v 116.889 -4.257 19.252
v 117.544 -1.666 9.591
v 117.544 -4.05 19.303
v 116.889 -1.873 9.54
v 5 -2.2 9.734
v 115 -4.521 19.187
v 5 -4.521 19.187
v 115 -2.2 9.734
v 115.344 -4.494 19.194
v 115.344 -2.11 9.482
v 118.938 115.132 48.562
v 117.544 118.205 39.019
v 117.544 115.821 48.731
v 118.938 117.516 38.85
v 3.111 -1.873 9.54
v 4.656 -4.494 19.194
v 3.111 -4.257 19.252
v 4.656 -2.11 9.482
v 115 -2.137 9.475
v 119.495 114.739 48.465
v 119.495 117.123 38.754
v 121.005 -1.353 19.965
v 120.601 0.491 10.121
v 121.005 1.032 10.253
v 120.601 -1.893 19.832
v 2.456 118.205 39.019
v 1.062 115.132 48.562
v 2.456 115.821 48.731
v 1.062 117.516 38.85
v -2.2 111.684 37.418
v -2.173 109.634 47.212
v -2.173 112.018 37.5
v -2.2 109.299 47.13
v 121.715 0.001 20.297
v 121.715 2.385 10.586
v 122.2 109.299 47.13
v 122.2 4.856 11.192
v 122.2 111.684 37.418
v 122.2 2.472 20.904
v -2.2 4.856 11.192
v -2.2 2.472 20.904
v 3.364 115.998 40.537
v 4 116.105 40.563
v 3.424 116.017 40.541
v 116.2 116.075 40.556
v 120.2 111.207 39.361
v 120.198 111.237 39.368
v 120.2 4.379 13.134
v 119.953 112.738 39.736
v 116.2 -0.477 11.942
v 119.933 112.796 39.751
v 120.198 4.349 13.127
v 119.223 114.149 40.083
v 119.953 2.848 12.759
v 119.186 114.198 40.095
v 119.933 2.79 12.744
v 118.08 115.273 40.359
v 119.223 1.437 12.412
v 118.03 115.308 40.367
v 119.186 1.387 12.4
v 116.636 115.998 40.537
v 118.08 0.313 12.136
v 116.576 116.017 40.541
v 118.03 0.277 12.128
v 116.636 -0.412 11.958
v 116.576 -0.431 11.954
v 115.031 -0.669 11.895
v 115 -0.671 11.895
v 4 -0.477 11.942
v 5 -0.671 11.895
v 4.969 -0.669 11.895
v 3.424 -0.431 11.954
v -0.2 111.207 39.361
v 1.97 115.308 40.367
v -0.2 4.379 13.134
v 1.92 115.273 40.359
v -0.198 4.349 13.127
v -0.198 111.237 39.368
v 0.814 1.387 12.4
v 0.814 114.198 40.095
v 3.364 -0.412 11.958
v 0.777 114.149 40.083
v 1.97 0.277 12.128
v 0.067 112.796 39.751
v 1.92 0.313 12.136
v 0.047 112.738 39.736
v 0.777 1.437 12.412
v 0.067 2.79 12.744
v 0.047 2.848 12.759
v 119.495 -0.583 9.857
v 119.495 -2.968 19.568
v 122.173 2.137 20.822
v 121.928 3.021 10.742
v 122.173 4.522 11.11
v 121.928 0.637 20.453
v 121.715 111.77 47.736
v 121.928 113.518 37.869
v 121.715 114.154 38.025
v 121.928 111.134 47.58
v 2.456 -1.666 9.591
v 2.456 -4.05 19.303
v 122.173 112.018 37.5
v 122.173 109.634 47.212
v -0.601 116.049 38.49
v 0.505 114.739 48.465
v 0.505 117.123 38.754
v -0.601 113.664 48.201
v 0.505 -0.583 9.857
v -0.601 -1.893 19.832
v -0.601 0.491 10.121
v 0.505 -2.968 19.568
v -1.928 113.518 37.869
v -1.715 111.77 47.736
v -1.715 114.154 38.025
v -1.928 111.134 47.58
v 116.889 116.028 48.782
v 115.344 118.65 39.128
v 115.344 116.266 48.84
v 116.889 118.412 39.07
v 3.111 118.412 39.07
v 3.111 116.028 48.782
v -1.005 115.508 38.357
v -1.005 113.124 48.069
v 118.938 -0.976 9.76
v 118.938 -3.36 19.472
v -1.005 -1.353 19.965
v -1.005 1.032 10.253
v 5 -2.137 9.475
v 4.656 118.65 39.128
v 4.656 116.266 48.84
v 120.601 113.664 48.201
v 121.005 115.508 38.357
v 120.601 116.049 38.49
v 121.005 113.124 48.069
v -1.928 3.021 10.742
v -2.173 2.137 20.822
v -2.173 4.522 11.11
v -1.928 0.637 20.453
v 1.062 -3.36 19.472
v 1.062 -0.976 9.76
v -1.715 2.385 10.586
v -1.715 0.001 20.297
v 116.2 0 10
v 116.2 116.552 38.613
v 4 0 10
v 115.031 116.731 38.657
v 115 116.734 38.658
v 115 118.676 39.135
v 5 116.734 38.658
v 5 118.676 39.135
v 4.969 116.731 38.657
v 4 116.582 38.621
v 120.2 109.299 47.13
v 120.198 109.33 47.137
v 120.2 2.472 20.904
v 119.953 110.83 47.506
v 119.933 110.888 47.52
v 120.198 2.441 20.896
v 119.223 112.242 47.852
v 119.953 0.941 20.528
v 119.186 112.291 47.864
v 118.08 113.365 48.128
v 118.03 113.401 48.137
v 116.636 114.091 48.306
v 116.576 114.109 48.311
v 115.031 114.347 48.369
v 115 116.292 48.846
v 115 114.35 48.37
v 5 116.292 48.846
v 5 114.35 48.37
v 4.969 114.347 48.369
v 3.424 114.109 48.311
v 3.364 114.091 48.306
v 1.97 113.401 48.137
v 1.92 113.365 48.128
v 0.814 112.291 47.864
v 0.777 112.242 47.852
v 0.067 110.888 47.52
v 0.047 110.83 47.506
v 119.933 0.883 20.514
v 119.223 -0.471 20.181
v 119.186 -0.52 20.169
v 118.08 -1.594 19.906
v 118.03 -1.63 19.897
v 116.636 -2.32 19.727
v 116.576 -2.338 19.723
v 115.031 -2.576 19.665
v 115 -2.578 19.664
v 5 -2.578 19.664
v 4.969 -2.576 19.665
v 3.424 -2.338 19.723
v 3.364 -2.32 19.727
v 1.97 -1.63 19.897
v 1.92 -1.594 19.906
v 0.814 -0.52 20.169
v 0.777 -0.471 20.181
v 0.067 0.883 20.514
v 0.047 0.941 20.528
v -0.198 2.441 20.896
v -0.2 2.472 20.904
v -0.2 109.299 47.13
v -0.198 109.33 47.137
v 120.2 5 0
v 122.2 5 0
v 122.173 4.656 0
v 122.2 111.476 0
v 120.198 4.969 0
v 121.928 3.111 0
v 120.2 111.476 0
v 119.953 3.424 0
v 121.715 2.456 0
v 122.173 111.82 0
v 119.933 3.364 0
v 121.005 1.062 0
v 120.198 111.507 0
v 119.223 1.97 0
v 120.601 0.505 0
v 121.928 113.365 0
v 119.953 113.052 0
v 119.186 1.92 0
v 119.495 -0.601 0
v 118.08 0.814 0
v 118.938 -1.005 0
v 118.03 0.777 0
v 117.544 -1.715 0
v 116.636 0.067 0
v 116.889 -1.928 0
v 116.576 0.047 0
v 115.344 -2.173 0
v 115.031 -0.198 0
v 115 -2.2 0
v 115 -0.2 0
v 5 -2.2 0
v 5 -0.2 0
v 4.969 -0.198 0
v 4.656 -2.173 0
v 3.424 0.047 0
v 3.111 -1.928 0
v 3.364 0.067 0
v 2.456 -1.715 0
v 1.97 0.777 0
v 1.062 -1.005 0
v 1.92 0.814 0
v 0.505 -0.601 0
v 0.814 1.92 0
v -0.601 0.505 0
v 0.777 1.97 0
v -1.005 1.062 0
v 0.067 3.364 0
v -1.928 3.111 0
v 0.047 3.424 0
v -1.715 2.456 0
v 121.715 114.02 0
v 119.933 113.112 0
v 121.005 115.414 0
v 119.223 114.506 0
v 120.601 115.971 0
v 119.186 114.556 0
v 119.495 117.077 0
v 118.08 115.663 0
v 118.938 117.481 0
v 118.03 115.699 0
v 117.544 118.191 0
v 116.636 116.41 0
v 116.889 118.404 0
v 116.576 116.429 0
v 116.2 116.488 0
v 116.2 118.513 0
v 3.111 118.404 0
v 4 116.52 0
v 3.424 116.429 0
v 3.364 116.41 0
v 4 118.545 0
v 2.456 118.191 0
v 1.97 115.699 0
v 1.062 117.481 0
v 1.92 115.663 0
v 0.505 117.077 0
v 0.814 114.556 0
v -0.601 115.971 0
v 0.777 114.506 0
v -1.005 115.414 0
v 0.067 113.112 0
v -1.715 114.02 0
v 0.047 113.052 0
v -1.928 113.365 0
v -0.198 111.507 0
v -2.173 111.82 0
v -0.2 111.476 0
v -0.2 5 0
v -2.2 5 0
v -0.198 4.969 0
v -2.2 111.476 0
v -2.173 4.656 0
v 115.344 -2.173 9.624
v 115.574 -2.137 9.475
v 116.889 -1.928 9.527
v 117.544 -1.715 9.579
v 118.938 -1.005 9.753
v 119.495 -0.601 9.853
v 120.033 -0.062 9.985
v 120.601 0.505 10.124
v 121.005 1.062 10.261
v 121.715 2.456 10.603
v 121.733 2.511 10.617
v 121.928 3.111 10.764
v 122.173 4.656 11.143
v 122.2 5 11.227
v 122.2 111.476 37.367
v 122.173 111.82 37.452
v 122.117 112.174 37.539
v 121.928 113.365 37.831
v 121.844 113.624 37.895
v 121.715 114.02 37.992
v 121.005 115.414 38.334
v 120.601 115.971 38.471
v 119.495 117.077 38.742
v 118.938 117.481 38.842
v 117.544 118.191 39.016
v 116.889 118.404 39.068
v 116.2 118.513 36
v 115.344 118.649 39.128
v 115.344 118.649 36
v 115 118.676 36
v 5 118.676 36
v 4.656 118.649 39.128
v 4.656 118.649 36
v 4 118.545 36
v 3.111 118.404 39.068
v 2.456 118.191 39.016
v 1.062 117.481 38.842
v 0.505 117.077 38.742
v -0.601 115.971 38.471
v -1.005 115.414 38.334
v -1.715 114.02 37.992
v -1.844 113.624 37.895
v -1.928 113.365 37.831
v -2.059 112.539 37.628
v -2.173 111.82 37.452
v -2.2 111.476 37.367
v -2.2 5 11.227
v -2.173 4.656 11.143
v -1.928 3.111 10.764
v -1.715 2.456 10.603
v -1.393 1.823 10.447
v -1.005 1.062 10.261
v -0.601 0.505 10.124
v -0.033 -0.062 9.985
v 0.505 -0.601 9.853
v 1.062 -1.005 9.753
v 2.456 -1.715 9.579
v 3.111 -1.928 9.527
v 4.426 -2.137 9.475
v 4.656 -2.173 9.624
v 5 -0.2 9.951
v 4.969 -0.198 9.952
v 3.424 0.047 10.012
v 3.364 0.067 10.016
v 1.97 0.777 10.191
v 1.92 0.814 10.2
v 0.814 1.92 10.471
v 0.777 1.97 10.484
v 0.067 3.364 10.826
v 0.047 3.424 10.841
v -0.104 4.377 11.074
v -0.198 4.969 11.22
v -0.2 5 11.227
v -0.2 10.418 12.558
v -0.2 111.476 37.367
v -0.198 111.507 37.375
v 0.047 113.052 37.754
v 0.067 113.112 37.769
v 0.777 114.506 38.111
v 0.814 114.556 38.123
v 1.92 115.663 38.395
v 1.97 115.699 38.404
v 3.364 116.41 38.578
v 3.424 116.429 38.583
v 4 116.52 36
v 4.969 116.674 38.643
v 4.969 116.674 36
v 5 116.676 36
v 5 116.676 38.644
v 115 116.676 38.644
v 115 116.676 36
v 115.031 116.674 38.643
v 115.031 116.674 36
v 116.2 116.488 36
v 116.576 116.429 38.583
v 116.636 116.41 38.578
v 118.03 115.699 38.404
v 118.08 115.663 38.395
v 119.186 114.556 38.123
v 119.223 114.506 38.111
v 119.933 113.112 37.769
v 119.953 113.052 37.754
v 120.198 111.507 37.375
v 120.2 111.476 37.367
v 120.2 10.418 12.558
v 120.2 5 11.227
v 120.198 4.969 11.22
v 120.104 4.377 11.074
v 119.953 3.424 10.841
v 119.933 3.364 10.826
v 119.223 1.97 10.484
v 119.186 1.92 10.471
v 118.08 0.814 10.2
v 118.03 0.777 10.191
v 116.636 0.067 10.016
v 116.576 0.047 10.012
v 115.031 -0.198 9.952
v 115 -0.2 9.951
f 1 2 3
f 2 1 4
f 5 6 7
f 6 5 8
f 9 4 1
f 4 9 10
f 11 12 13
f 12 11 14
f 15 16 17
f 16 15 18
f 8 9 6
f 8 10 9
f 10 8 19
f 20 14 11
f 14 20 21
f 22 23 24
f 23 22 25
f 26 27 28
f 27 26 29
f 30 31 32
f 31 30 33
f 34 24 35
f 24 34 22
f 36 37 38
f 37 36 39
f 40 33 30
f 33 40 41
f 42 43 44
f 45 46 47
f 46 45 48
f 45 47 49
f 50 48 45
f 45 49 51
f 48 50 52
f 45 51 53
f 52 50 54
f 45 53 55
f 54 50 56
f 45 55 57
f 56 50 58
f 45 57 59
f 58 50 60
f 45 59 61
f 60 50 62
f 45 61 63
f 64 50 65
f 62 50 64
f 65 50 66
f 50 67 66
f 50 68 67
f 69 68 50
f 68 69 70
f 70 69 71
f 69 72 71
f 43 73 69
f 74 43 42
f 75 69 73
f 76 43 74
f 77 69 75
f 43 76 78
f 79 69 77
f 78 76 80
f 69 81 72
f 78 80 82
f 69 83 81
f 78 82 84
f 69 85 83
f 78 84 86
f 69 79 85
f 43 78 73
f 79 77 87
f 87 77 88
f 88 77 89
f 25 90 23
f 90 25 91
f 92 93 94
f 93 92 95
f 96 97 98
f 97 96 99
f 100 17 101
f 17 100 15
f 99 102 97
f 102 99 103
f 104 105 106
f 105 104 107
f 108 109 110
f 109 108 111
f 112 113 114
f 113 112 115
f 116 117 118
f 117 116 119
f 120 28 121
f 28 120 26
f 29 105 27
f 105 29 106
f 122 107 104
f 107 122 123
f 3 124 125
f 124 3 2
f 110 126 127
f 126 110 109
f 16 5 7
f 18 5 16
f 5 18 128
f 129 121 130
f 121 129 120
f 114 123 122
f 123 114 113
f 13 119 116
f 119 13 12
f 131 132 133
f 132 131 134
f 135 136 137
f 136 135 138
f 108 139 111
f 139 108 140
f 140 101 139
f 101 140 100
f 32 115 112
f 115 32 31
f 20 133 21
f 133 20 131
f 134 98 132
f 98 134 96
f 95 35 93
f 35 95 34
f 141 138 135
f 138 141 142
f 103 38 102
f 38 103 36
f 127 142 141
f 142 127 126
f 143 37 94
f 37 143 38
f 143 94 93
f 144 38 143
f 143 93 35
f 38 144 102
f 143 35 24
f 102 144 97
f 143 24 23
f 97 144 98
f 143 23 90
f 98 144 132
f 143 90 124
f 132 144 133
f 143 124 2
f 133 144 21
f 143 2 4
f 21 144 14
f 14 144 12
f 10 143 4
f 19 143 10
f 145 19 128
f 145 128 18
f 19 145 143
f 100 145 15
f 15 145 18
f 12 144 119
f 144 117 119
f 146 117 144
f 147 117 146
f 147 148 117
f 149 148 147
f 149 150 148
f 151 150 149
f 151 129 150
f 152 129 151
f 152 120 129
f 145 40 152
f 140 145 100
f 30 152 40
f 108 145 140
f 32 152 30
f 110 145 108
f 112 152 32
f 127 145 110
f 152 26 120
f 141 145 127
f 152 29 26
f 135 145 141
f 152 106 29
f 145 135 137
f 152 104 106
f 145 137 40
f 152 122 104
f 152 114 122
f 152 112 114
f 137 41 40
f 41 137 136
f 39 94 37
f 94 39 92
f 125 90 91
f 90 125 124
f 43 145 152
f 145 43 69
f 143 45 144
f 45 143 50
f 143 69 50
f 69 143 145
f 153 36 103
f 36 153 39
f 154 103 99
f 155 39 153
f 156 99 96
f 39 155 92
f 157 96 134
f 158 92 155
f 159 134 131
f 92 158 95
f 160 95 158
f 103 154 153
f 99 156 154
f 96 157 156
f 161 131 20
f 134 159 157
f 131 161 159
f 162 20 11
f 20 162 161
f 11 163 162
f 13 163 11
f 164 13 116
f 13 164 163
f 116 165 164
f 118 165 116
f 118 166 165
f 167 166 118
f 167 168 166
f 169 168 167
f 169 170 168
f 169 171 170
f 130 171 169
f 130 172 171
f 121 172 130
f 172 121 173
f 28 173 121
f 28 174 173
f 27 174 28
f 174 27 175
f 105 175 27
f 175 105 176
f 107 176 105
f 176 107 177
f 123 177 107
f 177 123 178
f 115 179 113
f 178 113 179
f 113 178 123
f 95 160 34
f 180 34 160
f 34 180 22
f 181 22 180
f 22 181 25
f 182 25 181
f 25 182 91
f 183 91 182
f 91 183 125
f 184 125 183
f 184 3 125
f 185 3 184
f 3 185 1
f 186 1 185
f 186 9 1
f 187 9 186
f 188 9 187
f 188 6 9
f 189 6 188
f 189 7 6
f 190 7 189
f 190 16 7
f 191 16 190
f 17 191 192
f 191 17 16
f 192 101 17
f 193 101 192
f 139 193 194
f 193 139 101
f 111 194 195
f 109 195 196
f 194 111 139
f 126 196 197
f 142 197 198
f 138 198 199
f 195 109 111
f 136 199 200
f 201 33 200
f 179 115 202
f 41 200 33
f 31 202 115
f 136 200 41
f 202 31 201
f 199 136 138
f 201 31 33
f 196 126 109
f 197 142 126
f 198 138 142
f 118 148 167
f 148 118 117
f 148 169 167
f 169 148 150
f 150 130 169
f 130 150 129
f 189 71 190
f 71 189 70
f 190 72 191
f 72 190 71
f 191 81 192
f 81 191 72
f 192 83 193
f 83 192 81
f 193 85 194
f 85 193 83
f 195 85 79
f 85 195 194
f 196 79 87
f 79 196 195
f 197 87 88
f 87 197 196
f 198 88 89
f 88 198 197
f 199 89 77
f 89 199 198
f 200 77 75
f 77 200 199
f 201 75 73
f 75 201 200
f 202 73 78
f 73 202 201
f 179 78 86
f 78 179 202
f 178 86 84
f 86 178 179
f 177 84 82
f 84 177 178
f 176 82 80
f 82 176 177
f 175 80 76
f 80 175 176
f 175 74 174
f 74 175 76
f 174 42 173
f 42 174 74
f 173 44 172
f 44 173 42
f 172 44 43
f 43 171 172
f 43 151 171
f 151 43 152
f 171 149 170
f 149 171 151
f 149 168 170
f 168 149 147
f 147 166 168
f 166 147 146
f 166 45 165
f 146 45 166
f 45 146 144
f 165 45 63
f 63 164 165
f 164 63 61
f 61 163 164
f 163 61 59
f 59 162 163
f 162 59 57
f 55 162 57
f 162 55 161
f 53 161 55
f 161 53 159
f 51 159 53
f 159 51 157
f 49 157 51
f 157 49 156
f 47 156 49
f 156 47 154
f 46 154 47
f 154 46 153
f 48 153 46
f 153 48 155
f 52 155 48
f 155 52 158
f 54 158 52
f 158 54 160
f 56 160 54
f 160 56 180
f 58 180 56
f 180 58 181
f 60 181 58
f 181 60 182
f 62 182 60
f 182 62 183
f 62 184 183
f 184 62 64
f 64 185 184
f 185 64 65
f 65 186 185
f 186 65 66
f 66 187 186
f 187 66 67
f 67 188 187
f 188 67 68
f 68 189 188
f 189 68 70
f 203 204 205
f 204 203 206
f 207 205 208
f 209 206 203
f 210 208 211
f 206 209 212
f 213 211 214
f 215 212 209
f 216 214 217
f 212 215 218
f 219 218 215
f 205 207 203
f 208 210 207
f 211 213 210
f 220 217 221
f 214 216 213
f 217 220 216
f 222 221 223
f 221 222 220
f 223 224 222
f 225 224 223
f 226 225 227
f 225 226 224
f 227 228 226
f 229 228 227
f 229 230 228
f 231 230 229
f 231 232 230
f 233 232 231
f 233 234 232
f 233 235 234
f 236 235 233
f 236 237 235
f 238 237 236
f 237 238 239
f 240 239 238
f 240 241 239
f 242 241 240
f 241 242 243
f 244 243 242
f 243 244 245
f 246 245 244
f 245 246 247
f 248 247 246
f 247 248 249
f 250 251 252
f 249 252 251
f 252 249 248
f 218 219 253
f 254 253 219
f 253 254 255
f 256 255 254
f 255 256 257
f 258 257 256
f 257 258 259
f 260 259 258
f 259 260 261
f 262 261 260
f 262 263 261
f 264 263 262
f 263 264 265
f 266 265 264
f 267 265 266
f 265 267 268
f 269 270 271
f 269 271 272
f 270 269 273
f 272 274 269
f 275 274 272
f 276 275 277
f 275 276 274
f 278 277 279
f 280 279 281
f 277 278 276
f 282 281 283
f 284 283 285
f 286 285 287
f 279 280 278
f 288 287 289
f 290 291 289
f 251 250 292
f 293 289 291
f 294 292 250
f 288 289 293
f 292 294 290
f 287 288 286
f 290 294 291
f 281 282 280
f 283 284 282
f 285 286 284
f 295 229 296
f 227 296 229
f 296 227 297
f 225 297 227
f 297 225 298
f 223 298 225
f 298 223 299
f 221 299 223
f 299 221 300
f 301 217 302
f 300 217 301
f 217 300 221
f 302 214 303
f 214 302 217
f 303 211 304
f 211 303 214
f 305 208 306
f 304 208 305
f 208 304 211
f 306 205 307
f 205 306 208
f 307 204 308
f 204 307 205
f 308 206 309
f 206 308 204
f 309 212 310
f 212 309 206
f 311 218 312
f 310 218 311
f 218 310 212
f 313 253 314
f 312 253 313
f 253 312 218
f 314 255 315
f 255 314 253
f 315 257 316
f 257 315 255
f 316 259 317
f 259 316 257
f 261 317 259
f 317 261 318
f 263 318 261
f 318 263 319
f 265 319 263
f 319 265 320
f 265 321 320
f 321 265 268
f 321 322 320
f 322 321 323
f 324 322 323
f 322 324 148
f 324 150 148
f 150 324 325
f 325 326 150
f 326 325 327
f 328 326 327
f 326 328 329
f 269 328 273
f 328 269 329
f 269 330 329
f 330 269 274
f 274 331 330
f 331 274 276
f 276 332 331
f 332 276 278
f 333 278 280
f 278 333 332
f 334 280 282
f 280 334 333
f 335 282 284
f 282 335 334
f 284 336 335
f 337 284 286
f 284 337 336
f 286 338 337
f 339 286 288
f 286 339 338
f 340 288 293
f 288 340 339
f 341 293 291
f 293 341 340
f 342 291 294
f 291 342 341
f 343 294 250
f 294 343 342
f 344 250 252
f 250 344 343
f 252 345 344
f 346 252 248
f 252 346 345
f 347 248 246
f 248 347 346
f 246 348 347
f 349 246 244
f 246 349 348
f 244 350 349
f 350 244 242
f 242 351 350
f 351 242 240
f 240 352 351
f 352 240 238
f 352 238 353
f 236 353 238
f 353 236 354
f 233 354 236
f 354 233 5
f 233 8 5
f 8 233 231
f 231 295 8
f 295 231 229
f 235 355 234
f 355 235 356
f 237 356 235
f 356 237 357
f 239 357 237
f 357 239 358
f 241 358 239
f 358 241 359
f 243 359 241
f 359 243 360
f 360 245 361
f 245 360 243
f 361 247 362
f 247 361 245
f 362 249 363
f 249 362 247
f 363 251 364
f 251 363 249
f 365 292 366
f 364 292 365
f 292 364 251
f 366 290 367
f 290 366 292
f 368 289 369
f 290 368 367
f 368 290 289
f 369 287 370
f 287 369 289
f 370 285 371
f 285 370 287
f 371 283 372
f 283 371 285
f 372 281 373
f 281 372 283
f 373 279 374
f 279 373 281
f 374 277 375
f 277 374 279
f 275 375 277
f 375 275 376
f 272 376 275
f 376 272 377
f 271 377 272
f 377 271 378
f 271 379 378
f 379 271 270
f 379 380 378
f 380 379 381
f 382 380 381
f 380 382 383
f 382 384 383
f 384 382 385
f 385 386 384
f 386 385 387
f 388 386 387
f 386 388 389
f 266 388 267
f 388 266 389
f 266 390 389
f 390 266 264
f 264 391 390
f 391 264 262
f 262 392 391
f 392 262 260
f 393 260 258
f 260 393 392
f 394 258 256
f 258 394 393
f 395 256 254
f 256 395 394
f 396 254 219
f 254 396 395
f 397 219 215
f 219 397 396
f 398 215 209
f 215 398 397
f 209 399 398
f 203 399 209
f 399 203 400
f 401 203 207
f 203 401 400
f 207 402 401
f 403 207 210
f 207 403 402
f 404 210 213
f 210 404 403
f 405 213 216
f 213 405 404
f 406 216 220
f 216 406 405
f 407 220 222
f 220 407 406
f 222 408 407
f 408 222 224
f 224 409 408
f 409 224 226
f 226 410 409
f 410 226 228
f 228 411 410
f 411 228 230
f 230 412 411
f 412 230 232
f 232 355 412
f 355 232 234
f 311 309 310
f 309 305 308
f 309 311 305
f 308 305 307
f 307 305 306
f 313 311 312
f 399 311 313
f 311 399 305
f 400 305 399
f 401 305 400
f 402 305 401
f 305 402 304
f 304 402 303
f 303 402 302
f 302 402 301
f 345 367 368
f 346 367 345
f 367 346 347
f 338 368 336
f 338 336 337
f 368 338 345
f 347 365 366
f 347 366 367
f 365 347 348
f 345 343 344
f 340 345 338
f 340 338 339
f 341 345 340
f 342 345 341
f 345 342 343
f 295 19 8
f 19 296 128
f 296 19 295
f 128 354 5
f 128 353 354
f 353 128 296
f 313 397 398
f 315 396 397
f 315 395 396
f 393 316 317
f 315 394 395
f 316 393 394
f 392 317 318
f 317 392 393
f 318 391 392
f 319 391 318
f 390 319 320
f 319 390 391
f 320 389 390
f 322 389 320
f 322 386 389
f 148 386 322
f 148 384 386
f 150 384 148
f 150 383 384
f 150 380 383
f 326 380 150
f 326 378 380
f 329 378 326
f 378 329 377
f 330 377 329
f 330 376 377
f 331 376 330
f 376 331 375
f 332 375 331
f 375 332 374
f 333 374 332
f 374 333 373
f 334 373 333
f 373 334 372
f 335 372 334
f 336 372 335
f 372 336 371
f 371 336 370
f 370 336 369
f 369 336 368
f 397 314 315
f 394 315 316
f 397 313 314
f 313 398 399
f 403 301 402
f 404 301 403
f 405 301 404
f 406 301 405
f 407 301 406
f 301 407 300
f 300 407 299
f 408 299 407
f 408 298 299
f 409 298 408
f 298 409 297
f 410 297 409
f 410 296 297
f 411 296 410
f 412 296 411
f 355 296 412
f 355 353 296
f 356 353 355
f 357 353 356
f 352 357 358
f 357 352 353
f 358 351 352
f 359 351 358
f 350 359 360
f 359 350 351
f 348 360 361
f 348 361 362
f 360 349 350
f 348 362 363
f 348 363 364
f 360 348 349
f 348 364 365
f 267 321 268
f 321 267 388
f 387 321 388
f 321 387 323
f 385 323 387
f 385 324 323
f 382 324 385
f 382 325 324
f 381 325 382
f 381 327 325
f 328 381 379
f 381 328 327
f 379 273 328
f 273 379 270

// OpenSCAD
// file: lib/utils.scad
include <params.scad>;

function tol(val) = val - tolerance;

module cone(r, angle, invert=false) {
    h = tan(angle / 2) * r;
    if (invert) {
        cylinder(r1=r,r2=0,h=h, $fn=20); 
    } else {
        cylinder(r1=0,r2=r,h=h, $fn=20); 
    }
}

module profile($fn=20) {
    minkowski() {
        translate([fan_case_radius, fan_case_radius, 0])
            square(fan_case - fan_case_radius * 2);
        circle(fan_case_radius, $fn);
    }
}

module fan_mount_points(radius, $fn=20) {
    offset = (fan_case - fan_screw_distance) / 2;
    translate([offset, offset, 0]) {
        circle(radius, $fn);
        translate([fan_screw_distance, 0, 0])
            circle(radius, $fn);
        translate([fan_screw_distance, fan_screw_distance, 0])
            circle(radius, $fn);
        translate([0, fan_screw_distance, 0])
            circle(radius, $fn);
    }
}

module square_grill(width, height, fin_width, fin_count) {
    fin_spacing = width / fin_count;
    difference() {
        square(width);
        union() {
            for (i = [0:1:fin_count]) {
                translate([(i + 1) * fin_spacing - (fin_spacing / 2) - (fin_width / 2), 0, 0])
                    square([fin_width, height]);
            }
        }
    }
}
// file: lib/params.scad
fan_case = 120;
fan_screw_distance = 105;
fan_case_depth = 25;
fan_case_radius = 5;
fan_case_screw_radius = 2.5;
fan_case_screw_head_radius = 3;
fan_case_screw_head_angle = 90;

grill_screw_size = 3;
grill_screw_radius = grill_screw_size / 2;
grill_screw_inset = 2;
grill_radius = 114 / 2;
grill_fin_offset = 10;
grill_fin_thickness = 2;
grill_fin_degrees = 30;

rear_grill_thickness = 2;

front_grill_thickness = 2;
front_grill_fin_count = 6;
front_grill_fin_thickness = 2;

filter_thickness = 5;
filter_width = fan_screw_distance - fan_case_screw_radius * 3;
filter_offset = (fan_case - filter_width) / 2;

base_retainer_thickness = 2;
base_height = 40;
base_cut_offset = 10;

tolerance = 0.2;
// main file
include <lib/params.scad>;
use <lib/utils.scad>;

case_length = fan_case + tolerance + base_retainer_thickness;
base_cut_angle = atan((base_height - base_cut_offset) / case_length);
base_length = (cos(base_cut_angle) * case_length) - base_retainer_thickness - tolerance;

module base_profile($fn=20) {
    minkowski() {
        translate([fan_case_radius, fan_case_radius, 0])
            square([fan_case - fan_case_radius * 2, base_length - fan_case_radius * 2]);
        circle(fan_case_radius, $fn);
    }
}

module base_riser() {
    difference() {
        offset(r=tolerance+base_retainer_thickness)
            base_profile();
        offset(r=tolerance)
            base_profile();
    }
}

module base_retainer() {
    difference() {
        offset(r=tolerance+base_retainer_thickness)
            profile();
        offset(r=tolerance)
            profile();
    }
}

difference() {
    union() {
        translate([0, 0, base_cut_offset])
            rotate([base_cut_angle, 0, 0])
                union() {
                    linear_extrude(height=10)
                        base_retainer();
                    difference() {
                        linear_extrude(height=2)
                            offset(r=tolerance+base_retainer_thickness)
                                profile();
                        linear_extrude(height=2)
                            translate([4, 0, 0])
                                square([case_length - 10, case_length]);
                    }
                }

        difference() {
            linear_extrude(height=base_height)
                base_riser();
            translate([0, 0, base_cut_offset])
                rotate([base_cut_angle, 0, 0])
                    linear_extrude(height=base_height)
                    offset(tolerance + base_retainer_thickness)
                        square([fan_case, fan_case + 20]);
        }
    }
    translate([4, case_length - 10, 0])
        cube([case_length - 10, 20, base_height - 4]);
}
